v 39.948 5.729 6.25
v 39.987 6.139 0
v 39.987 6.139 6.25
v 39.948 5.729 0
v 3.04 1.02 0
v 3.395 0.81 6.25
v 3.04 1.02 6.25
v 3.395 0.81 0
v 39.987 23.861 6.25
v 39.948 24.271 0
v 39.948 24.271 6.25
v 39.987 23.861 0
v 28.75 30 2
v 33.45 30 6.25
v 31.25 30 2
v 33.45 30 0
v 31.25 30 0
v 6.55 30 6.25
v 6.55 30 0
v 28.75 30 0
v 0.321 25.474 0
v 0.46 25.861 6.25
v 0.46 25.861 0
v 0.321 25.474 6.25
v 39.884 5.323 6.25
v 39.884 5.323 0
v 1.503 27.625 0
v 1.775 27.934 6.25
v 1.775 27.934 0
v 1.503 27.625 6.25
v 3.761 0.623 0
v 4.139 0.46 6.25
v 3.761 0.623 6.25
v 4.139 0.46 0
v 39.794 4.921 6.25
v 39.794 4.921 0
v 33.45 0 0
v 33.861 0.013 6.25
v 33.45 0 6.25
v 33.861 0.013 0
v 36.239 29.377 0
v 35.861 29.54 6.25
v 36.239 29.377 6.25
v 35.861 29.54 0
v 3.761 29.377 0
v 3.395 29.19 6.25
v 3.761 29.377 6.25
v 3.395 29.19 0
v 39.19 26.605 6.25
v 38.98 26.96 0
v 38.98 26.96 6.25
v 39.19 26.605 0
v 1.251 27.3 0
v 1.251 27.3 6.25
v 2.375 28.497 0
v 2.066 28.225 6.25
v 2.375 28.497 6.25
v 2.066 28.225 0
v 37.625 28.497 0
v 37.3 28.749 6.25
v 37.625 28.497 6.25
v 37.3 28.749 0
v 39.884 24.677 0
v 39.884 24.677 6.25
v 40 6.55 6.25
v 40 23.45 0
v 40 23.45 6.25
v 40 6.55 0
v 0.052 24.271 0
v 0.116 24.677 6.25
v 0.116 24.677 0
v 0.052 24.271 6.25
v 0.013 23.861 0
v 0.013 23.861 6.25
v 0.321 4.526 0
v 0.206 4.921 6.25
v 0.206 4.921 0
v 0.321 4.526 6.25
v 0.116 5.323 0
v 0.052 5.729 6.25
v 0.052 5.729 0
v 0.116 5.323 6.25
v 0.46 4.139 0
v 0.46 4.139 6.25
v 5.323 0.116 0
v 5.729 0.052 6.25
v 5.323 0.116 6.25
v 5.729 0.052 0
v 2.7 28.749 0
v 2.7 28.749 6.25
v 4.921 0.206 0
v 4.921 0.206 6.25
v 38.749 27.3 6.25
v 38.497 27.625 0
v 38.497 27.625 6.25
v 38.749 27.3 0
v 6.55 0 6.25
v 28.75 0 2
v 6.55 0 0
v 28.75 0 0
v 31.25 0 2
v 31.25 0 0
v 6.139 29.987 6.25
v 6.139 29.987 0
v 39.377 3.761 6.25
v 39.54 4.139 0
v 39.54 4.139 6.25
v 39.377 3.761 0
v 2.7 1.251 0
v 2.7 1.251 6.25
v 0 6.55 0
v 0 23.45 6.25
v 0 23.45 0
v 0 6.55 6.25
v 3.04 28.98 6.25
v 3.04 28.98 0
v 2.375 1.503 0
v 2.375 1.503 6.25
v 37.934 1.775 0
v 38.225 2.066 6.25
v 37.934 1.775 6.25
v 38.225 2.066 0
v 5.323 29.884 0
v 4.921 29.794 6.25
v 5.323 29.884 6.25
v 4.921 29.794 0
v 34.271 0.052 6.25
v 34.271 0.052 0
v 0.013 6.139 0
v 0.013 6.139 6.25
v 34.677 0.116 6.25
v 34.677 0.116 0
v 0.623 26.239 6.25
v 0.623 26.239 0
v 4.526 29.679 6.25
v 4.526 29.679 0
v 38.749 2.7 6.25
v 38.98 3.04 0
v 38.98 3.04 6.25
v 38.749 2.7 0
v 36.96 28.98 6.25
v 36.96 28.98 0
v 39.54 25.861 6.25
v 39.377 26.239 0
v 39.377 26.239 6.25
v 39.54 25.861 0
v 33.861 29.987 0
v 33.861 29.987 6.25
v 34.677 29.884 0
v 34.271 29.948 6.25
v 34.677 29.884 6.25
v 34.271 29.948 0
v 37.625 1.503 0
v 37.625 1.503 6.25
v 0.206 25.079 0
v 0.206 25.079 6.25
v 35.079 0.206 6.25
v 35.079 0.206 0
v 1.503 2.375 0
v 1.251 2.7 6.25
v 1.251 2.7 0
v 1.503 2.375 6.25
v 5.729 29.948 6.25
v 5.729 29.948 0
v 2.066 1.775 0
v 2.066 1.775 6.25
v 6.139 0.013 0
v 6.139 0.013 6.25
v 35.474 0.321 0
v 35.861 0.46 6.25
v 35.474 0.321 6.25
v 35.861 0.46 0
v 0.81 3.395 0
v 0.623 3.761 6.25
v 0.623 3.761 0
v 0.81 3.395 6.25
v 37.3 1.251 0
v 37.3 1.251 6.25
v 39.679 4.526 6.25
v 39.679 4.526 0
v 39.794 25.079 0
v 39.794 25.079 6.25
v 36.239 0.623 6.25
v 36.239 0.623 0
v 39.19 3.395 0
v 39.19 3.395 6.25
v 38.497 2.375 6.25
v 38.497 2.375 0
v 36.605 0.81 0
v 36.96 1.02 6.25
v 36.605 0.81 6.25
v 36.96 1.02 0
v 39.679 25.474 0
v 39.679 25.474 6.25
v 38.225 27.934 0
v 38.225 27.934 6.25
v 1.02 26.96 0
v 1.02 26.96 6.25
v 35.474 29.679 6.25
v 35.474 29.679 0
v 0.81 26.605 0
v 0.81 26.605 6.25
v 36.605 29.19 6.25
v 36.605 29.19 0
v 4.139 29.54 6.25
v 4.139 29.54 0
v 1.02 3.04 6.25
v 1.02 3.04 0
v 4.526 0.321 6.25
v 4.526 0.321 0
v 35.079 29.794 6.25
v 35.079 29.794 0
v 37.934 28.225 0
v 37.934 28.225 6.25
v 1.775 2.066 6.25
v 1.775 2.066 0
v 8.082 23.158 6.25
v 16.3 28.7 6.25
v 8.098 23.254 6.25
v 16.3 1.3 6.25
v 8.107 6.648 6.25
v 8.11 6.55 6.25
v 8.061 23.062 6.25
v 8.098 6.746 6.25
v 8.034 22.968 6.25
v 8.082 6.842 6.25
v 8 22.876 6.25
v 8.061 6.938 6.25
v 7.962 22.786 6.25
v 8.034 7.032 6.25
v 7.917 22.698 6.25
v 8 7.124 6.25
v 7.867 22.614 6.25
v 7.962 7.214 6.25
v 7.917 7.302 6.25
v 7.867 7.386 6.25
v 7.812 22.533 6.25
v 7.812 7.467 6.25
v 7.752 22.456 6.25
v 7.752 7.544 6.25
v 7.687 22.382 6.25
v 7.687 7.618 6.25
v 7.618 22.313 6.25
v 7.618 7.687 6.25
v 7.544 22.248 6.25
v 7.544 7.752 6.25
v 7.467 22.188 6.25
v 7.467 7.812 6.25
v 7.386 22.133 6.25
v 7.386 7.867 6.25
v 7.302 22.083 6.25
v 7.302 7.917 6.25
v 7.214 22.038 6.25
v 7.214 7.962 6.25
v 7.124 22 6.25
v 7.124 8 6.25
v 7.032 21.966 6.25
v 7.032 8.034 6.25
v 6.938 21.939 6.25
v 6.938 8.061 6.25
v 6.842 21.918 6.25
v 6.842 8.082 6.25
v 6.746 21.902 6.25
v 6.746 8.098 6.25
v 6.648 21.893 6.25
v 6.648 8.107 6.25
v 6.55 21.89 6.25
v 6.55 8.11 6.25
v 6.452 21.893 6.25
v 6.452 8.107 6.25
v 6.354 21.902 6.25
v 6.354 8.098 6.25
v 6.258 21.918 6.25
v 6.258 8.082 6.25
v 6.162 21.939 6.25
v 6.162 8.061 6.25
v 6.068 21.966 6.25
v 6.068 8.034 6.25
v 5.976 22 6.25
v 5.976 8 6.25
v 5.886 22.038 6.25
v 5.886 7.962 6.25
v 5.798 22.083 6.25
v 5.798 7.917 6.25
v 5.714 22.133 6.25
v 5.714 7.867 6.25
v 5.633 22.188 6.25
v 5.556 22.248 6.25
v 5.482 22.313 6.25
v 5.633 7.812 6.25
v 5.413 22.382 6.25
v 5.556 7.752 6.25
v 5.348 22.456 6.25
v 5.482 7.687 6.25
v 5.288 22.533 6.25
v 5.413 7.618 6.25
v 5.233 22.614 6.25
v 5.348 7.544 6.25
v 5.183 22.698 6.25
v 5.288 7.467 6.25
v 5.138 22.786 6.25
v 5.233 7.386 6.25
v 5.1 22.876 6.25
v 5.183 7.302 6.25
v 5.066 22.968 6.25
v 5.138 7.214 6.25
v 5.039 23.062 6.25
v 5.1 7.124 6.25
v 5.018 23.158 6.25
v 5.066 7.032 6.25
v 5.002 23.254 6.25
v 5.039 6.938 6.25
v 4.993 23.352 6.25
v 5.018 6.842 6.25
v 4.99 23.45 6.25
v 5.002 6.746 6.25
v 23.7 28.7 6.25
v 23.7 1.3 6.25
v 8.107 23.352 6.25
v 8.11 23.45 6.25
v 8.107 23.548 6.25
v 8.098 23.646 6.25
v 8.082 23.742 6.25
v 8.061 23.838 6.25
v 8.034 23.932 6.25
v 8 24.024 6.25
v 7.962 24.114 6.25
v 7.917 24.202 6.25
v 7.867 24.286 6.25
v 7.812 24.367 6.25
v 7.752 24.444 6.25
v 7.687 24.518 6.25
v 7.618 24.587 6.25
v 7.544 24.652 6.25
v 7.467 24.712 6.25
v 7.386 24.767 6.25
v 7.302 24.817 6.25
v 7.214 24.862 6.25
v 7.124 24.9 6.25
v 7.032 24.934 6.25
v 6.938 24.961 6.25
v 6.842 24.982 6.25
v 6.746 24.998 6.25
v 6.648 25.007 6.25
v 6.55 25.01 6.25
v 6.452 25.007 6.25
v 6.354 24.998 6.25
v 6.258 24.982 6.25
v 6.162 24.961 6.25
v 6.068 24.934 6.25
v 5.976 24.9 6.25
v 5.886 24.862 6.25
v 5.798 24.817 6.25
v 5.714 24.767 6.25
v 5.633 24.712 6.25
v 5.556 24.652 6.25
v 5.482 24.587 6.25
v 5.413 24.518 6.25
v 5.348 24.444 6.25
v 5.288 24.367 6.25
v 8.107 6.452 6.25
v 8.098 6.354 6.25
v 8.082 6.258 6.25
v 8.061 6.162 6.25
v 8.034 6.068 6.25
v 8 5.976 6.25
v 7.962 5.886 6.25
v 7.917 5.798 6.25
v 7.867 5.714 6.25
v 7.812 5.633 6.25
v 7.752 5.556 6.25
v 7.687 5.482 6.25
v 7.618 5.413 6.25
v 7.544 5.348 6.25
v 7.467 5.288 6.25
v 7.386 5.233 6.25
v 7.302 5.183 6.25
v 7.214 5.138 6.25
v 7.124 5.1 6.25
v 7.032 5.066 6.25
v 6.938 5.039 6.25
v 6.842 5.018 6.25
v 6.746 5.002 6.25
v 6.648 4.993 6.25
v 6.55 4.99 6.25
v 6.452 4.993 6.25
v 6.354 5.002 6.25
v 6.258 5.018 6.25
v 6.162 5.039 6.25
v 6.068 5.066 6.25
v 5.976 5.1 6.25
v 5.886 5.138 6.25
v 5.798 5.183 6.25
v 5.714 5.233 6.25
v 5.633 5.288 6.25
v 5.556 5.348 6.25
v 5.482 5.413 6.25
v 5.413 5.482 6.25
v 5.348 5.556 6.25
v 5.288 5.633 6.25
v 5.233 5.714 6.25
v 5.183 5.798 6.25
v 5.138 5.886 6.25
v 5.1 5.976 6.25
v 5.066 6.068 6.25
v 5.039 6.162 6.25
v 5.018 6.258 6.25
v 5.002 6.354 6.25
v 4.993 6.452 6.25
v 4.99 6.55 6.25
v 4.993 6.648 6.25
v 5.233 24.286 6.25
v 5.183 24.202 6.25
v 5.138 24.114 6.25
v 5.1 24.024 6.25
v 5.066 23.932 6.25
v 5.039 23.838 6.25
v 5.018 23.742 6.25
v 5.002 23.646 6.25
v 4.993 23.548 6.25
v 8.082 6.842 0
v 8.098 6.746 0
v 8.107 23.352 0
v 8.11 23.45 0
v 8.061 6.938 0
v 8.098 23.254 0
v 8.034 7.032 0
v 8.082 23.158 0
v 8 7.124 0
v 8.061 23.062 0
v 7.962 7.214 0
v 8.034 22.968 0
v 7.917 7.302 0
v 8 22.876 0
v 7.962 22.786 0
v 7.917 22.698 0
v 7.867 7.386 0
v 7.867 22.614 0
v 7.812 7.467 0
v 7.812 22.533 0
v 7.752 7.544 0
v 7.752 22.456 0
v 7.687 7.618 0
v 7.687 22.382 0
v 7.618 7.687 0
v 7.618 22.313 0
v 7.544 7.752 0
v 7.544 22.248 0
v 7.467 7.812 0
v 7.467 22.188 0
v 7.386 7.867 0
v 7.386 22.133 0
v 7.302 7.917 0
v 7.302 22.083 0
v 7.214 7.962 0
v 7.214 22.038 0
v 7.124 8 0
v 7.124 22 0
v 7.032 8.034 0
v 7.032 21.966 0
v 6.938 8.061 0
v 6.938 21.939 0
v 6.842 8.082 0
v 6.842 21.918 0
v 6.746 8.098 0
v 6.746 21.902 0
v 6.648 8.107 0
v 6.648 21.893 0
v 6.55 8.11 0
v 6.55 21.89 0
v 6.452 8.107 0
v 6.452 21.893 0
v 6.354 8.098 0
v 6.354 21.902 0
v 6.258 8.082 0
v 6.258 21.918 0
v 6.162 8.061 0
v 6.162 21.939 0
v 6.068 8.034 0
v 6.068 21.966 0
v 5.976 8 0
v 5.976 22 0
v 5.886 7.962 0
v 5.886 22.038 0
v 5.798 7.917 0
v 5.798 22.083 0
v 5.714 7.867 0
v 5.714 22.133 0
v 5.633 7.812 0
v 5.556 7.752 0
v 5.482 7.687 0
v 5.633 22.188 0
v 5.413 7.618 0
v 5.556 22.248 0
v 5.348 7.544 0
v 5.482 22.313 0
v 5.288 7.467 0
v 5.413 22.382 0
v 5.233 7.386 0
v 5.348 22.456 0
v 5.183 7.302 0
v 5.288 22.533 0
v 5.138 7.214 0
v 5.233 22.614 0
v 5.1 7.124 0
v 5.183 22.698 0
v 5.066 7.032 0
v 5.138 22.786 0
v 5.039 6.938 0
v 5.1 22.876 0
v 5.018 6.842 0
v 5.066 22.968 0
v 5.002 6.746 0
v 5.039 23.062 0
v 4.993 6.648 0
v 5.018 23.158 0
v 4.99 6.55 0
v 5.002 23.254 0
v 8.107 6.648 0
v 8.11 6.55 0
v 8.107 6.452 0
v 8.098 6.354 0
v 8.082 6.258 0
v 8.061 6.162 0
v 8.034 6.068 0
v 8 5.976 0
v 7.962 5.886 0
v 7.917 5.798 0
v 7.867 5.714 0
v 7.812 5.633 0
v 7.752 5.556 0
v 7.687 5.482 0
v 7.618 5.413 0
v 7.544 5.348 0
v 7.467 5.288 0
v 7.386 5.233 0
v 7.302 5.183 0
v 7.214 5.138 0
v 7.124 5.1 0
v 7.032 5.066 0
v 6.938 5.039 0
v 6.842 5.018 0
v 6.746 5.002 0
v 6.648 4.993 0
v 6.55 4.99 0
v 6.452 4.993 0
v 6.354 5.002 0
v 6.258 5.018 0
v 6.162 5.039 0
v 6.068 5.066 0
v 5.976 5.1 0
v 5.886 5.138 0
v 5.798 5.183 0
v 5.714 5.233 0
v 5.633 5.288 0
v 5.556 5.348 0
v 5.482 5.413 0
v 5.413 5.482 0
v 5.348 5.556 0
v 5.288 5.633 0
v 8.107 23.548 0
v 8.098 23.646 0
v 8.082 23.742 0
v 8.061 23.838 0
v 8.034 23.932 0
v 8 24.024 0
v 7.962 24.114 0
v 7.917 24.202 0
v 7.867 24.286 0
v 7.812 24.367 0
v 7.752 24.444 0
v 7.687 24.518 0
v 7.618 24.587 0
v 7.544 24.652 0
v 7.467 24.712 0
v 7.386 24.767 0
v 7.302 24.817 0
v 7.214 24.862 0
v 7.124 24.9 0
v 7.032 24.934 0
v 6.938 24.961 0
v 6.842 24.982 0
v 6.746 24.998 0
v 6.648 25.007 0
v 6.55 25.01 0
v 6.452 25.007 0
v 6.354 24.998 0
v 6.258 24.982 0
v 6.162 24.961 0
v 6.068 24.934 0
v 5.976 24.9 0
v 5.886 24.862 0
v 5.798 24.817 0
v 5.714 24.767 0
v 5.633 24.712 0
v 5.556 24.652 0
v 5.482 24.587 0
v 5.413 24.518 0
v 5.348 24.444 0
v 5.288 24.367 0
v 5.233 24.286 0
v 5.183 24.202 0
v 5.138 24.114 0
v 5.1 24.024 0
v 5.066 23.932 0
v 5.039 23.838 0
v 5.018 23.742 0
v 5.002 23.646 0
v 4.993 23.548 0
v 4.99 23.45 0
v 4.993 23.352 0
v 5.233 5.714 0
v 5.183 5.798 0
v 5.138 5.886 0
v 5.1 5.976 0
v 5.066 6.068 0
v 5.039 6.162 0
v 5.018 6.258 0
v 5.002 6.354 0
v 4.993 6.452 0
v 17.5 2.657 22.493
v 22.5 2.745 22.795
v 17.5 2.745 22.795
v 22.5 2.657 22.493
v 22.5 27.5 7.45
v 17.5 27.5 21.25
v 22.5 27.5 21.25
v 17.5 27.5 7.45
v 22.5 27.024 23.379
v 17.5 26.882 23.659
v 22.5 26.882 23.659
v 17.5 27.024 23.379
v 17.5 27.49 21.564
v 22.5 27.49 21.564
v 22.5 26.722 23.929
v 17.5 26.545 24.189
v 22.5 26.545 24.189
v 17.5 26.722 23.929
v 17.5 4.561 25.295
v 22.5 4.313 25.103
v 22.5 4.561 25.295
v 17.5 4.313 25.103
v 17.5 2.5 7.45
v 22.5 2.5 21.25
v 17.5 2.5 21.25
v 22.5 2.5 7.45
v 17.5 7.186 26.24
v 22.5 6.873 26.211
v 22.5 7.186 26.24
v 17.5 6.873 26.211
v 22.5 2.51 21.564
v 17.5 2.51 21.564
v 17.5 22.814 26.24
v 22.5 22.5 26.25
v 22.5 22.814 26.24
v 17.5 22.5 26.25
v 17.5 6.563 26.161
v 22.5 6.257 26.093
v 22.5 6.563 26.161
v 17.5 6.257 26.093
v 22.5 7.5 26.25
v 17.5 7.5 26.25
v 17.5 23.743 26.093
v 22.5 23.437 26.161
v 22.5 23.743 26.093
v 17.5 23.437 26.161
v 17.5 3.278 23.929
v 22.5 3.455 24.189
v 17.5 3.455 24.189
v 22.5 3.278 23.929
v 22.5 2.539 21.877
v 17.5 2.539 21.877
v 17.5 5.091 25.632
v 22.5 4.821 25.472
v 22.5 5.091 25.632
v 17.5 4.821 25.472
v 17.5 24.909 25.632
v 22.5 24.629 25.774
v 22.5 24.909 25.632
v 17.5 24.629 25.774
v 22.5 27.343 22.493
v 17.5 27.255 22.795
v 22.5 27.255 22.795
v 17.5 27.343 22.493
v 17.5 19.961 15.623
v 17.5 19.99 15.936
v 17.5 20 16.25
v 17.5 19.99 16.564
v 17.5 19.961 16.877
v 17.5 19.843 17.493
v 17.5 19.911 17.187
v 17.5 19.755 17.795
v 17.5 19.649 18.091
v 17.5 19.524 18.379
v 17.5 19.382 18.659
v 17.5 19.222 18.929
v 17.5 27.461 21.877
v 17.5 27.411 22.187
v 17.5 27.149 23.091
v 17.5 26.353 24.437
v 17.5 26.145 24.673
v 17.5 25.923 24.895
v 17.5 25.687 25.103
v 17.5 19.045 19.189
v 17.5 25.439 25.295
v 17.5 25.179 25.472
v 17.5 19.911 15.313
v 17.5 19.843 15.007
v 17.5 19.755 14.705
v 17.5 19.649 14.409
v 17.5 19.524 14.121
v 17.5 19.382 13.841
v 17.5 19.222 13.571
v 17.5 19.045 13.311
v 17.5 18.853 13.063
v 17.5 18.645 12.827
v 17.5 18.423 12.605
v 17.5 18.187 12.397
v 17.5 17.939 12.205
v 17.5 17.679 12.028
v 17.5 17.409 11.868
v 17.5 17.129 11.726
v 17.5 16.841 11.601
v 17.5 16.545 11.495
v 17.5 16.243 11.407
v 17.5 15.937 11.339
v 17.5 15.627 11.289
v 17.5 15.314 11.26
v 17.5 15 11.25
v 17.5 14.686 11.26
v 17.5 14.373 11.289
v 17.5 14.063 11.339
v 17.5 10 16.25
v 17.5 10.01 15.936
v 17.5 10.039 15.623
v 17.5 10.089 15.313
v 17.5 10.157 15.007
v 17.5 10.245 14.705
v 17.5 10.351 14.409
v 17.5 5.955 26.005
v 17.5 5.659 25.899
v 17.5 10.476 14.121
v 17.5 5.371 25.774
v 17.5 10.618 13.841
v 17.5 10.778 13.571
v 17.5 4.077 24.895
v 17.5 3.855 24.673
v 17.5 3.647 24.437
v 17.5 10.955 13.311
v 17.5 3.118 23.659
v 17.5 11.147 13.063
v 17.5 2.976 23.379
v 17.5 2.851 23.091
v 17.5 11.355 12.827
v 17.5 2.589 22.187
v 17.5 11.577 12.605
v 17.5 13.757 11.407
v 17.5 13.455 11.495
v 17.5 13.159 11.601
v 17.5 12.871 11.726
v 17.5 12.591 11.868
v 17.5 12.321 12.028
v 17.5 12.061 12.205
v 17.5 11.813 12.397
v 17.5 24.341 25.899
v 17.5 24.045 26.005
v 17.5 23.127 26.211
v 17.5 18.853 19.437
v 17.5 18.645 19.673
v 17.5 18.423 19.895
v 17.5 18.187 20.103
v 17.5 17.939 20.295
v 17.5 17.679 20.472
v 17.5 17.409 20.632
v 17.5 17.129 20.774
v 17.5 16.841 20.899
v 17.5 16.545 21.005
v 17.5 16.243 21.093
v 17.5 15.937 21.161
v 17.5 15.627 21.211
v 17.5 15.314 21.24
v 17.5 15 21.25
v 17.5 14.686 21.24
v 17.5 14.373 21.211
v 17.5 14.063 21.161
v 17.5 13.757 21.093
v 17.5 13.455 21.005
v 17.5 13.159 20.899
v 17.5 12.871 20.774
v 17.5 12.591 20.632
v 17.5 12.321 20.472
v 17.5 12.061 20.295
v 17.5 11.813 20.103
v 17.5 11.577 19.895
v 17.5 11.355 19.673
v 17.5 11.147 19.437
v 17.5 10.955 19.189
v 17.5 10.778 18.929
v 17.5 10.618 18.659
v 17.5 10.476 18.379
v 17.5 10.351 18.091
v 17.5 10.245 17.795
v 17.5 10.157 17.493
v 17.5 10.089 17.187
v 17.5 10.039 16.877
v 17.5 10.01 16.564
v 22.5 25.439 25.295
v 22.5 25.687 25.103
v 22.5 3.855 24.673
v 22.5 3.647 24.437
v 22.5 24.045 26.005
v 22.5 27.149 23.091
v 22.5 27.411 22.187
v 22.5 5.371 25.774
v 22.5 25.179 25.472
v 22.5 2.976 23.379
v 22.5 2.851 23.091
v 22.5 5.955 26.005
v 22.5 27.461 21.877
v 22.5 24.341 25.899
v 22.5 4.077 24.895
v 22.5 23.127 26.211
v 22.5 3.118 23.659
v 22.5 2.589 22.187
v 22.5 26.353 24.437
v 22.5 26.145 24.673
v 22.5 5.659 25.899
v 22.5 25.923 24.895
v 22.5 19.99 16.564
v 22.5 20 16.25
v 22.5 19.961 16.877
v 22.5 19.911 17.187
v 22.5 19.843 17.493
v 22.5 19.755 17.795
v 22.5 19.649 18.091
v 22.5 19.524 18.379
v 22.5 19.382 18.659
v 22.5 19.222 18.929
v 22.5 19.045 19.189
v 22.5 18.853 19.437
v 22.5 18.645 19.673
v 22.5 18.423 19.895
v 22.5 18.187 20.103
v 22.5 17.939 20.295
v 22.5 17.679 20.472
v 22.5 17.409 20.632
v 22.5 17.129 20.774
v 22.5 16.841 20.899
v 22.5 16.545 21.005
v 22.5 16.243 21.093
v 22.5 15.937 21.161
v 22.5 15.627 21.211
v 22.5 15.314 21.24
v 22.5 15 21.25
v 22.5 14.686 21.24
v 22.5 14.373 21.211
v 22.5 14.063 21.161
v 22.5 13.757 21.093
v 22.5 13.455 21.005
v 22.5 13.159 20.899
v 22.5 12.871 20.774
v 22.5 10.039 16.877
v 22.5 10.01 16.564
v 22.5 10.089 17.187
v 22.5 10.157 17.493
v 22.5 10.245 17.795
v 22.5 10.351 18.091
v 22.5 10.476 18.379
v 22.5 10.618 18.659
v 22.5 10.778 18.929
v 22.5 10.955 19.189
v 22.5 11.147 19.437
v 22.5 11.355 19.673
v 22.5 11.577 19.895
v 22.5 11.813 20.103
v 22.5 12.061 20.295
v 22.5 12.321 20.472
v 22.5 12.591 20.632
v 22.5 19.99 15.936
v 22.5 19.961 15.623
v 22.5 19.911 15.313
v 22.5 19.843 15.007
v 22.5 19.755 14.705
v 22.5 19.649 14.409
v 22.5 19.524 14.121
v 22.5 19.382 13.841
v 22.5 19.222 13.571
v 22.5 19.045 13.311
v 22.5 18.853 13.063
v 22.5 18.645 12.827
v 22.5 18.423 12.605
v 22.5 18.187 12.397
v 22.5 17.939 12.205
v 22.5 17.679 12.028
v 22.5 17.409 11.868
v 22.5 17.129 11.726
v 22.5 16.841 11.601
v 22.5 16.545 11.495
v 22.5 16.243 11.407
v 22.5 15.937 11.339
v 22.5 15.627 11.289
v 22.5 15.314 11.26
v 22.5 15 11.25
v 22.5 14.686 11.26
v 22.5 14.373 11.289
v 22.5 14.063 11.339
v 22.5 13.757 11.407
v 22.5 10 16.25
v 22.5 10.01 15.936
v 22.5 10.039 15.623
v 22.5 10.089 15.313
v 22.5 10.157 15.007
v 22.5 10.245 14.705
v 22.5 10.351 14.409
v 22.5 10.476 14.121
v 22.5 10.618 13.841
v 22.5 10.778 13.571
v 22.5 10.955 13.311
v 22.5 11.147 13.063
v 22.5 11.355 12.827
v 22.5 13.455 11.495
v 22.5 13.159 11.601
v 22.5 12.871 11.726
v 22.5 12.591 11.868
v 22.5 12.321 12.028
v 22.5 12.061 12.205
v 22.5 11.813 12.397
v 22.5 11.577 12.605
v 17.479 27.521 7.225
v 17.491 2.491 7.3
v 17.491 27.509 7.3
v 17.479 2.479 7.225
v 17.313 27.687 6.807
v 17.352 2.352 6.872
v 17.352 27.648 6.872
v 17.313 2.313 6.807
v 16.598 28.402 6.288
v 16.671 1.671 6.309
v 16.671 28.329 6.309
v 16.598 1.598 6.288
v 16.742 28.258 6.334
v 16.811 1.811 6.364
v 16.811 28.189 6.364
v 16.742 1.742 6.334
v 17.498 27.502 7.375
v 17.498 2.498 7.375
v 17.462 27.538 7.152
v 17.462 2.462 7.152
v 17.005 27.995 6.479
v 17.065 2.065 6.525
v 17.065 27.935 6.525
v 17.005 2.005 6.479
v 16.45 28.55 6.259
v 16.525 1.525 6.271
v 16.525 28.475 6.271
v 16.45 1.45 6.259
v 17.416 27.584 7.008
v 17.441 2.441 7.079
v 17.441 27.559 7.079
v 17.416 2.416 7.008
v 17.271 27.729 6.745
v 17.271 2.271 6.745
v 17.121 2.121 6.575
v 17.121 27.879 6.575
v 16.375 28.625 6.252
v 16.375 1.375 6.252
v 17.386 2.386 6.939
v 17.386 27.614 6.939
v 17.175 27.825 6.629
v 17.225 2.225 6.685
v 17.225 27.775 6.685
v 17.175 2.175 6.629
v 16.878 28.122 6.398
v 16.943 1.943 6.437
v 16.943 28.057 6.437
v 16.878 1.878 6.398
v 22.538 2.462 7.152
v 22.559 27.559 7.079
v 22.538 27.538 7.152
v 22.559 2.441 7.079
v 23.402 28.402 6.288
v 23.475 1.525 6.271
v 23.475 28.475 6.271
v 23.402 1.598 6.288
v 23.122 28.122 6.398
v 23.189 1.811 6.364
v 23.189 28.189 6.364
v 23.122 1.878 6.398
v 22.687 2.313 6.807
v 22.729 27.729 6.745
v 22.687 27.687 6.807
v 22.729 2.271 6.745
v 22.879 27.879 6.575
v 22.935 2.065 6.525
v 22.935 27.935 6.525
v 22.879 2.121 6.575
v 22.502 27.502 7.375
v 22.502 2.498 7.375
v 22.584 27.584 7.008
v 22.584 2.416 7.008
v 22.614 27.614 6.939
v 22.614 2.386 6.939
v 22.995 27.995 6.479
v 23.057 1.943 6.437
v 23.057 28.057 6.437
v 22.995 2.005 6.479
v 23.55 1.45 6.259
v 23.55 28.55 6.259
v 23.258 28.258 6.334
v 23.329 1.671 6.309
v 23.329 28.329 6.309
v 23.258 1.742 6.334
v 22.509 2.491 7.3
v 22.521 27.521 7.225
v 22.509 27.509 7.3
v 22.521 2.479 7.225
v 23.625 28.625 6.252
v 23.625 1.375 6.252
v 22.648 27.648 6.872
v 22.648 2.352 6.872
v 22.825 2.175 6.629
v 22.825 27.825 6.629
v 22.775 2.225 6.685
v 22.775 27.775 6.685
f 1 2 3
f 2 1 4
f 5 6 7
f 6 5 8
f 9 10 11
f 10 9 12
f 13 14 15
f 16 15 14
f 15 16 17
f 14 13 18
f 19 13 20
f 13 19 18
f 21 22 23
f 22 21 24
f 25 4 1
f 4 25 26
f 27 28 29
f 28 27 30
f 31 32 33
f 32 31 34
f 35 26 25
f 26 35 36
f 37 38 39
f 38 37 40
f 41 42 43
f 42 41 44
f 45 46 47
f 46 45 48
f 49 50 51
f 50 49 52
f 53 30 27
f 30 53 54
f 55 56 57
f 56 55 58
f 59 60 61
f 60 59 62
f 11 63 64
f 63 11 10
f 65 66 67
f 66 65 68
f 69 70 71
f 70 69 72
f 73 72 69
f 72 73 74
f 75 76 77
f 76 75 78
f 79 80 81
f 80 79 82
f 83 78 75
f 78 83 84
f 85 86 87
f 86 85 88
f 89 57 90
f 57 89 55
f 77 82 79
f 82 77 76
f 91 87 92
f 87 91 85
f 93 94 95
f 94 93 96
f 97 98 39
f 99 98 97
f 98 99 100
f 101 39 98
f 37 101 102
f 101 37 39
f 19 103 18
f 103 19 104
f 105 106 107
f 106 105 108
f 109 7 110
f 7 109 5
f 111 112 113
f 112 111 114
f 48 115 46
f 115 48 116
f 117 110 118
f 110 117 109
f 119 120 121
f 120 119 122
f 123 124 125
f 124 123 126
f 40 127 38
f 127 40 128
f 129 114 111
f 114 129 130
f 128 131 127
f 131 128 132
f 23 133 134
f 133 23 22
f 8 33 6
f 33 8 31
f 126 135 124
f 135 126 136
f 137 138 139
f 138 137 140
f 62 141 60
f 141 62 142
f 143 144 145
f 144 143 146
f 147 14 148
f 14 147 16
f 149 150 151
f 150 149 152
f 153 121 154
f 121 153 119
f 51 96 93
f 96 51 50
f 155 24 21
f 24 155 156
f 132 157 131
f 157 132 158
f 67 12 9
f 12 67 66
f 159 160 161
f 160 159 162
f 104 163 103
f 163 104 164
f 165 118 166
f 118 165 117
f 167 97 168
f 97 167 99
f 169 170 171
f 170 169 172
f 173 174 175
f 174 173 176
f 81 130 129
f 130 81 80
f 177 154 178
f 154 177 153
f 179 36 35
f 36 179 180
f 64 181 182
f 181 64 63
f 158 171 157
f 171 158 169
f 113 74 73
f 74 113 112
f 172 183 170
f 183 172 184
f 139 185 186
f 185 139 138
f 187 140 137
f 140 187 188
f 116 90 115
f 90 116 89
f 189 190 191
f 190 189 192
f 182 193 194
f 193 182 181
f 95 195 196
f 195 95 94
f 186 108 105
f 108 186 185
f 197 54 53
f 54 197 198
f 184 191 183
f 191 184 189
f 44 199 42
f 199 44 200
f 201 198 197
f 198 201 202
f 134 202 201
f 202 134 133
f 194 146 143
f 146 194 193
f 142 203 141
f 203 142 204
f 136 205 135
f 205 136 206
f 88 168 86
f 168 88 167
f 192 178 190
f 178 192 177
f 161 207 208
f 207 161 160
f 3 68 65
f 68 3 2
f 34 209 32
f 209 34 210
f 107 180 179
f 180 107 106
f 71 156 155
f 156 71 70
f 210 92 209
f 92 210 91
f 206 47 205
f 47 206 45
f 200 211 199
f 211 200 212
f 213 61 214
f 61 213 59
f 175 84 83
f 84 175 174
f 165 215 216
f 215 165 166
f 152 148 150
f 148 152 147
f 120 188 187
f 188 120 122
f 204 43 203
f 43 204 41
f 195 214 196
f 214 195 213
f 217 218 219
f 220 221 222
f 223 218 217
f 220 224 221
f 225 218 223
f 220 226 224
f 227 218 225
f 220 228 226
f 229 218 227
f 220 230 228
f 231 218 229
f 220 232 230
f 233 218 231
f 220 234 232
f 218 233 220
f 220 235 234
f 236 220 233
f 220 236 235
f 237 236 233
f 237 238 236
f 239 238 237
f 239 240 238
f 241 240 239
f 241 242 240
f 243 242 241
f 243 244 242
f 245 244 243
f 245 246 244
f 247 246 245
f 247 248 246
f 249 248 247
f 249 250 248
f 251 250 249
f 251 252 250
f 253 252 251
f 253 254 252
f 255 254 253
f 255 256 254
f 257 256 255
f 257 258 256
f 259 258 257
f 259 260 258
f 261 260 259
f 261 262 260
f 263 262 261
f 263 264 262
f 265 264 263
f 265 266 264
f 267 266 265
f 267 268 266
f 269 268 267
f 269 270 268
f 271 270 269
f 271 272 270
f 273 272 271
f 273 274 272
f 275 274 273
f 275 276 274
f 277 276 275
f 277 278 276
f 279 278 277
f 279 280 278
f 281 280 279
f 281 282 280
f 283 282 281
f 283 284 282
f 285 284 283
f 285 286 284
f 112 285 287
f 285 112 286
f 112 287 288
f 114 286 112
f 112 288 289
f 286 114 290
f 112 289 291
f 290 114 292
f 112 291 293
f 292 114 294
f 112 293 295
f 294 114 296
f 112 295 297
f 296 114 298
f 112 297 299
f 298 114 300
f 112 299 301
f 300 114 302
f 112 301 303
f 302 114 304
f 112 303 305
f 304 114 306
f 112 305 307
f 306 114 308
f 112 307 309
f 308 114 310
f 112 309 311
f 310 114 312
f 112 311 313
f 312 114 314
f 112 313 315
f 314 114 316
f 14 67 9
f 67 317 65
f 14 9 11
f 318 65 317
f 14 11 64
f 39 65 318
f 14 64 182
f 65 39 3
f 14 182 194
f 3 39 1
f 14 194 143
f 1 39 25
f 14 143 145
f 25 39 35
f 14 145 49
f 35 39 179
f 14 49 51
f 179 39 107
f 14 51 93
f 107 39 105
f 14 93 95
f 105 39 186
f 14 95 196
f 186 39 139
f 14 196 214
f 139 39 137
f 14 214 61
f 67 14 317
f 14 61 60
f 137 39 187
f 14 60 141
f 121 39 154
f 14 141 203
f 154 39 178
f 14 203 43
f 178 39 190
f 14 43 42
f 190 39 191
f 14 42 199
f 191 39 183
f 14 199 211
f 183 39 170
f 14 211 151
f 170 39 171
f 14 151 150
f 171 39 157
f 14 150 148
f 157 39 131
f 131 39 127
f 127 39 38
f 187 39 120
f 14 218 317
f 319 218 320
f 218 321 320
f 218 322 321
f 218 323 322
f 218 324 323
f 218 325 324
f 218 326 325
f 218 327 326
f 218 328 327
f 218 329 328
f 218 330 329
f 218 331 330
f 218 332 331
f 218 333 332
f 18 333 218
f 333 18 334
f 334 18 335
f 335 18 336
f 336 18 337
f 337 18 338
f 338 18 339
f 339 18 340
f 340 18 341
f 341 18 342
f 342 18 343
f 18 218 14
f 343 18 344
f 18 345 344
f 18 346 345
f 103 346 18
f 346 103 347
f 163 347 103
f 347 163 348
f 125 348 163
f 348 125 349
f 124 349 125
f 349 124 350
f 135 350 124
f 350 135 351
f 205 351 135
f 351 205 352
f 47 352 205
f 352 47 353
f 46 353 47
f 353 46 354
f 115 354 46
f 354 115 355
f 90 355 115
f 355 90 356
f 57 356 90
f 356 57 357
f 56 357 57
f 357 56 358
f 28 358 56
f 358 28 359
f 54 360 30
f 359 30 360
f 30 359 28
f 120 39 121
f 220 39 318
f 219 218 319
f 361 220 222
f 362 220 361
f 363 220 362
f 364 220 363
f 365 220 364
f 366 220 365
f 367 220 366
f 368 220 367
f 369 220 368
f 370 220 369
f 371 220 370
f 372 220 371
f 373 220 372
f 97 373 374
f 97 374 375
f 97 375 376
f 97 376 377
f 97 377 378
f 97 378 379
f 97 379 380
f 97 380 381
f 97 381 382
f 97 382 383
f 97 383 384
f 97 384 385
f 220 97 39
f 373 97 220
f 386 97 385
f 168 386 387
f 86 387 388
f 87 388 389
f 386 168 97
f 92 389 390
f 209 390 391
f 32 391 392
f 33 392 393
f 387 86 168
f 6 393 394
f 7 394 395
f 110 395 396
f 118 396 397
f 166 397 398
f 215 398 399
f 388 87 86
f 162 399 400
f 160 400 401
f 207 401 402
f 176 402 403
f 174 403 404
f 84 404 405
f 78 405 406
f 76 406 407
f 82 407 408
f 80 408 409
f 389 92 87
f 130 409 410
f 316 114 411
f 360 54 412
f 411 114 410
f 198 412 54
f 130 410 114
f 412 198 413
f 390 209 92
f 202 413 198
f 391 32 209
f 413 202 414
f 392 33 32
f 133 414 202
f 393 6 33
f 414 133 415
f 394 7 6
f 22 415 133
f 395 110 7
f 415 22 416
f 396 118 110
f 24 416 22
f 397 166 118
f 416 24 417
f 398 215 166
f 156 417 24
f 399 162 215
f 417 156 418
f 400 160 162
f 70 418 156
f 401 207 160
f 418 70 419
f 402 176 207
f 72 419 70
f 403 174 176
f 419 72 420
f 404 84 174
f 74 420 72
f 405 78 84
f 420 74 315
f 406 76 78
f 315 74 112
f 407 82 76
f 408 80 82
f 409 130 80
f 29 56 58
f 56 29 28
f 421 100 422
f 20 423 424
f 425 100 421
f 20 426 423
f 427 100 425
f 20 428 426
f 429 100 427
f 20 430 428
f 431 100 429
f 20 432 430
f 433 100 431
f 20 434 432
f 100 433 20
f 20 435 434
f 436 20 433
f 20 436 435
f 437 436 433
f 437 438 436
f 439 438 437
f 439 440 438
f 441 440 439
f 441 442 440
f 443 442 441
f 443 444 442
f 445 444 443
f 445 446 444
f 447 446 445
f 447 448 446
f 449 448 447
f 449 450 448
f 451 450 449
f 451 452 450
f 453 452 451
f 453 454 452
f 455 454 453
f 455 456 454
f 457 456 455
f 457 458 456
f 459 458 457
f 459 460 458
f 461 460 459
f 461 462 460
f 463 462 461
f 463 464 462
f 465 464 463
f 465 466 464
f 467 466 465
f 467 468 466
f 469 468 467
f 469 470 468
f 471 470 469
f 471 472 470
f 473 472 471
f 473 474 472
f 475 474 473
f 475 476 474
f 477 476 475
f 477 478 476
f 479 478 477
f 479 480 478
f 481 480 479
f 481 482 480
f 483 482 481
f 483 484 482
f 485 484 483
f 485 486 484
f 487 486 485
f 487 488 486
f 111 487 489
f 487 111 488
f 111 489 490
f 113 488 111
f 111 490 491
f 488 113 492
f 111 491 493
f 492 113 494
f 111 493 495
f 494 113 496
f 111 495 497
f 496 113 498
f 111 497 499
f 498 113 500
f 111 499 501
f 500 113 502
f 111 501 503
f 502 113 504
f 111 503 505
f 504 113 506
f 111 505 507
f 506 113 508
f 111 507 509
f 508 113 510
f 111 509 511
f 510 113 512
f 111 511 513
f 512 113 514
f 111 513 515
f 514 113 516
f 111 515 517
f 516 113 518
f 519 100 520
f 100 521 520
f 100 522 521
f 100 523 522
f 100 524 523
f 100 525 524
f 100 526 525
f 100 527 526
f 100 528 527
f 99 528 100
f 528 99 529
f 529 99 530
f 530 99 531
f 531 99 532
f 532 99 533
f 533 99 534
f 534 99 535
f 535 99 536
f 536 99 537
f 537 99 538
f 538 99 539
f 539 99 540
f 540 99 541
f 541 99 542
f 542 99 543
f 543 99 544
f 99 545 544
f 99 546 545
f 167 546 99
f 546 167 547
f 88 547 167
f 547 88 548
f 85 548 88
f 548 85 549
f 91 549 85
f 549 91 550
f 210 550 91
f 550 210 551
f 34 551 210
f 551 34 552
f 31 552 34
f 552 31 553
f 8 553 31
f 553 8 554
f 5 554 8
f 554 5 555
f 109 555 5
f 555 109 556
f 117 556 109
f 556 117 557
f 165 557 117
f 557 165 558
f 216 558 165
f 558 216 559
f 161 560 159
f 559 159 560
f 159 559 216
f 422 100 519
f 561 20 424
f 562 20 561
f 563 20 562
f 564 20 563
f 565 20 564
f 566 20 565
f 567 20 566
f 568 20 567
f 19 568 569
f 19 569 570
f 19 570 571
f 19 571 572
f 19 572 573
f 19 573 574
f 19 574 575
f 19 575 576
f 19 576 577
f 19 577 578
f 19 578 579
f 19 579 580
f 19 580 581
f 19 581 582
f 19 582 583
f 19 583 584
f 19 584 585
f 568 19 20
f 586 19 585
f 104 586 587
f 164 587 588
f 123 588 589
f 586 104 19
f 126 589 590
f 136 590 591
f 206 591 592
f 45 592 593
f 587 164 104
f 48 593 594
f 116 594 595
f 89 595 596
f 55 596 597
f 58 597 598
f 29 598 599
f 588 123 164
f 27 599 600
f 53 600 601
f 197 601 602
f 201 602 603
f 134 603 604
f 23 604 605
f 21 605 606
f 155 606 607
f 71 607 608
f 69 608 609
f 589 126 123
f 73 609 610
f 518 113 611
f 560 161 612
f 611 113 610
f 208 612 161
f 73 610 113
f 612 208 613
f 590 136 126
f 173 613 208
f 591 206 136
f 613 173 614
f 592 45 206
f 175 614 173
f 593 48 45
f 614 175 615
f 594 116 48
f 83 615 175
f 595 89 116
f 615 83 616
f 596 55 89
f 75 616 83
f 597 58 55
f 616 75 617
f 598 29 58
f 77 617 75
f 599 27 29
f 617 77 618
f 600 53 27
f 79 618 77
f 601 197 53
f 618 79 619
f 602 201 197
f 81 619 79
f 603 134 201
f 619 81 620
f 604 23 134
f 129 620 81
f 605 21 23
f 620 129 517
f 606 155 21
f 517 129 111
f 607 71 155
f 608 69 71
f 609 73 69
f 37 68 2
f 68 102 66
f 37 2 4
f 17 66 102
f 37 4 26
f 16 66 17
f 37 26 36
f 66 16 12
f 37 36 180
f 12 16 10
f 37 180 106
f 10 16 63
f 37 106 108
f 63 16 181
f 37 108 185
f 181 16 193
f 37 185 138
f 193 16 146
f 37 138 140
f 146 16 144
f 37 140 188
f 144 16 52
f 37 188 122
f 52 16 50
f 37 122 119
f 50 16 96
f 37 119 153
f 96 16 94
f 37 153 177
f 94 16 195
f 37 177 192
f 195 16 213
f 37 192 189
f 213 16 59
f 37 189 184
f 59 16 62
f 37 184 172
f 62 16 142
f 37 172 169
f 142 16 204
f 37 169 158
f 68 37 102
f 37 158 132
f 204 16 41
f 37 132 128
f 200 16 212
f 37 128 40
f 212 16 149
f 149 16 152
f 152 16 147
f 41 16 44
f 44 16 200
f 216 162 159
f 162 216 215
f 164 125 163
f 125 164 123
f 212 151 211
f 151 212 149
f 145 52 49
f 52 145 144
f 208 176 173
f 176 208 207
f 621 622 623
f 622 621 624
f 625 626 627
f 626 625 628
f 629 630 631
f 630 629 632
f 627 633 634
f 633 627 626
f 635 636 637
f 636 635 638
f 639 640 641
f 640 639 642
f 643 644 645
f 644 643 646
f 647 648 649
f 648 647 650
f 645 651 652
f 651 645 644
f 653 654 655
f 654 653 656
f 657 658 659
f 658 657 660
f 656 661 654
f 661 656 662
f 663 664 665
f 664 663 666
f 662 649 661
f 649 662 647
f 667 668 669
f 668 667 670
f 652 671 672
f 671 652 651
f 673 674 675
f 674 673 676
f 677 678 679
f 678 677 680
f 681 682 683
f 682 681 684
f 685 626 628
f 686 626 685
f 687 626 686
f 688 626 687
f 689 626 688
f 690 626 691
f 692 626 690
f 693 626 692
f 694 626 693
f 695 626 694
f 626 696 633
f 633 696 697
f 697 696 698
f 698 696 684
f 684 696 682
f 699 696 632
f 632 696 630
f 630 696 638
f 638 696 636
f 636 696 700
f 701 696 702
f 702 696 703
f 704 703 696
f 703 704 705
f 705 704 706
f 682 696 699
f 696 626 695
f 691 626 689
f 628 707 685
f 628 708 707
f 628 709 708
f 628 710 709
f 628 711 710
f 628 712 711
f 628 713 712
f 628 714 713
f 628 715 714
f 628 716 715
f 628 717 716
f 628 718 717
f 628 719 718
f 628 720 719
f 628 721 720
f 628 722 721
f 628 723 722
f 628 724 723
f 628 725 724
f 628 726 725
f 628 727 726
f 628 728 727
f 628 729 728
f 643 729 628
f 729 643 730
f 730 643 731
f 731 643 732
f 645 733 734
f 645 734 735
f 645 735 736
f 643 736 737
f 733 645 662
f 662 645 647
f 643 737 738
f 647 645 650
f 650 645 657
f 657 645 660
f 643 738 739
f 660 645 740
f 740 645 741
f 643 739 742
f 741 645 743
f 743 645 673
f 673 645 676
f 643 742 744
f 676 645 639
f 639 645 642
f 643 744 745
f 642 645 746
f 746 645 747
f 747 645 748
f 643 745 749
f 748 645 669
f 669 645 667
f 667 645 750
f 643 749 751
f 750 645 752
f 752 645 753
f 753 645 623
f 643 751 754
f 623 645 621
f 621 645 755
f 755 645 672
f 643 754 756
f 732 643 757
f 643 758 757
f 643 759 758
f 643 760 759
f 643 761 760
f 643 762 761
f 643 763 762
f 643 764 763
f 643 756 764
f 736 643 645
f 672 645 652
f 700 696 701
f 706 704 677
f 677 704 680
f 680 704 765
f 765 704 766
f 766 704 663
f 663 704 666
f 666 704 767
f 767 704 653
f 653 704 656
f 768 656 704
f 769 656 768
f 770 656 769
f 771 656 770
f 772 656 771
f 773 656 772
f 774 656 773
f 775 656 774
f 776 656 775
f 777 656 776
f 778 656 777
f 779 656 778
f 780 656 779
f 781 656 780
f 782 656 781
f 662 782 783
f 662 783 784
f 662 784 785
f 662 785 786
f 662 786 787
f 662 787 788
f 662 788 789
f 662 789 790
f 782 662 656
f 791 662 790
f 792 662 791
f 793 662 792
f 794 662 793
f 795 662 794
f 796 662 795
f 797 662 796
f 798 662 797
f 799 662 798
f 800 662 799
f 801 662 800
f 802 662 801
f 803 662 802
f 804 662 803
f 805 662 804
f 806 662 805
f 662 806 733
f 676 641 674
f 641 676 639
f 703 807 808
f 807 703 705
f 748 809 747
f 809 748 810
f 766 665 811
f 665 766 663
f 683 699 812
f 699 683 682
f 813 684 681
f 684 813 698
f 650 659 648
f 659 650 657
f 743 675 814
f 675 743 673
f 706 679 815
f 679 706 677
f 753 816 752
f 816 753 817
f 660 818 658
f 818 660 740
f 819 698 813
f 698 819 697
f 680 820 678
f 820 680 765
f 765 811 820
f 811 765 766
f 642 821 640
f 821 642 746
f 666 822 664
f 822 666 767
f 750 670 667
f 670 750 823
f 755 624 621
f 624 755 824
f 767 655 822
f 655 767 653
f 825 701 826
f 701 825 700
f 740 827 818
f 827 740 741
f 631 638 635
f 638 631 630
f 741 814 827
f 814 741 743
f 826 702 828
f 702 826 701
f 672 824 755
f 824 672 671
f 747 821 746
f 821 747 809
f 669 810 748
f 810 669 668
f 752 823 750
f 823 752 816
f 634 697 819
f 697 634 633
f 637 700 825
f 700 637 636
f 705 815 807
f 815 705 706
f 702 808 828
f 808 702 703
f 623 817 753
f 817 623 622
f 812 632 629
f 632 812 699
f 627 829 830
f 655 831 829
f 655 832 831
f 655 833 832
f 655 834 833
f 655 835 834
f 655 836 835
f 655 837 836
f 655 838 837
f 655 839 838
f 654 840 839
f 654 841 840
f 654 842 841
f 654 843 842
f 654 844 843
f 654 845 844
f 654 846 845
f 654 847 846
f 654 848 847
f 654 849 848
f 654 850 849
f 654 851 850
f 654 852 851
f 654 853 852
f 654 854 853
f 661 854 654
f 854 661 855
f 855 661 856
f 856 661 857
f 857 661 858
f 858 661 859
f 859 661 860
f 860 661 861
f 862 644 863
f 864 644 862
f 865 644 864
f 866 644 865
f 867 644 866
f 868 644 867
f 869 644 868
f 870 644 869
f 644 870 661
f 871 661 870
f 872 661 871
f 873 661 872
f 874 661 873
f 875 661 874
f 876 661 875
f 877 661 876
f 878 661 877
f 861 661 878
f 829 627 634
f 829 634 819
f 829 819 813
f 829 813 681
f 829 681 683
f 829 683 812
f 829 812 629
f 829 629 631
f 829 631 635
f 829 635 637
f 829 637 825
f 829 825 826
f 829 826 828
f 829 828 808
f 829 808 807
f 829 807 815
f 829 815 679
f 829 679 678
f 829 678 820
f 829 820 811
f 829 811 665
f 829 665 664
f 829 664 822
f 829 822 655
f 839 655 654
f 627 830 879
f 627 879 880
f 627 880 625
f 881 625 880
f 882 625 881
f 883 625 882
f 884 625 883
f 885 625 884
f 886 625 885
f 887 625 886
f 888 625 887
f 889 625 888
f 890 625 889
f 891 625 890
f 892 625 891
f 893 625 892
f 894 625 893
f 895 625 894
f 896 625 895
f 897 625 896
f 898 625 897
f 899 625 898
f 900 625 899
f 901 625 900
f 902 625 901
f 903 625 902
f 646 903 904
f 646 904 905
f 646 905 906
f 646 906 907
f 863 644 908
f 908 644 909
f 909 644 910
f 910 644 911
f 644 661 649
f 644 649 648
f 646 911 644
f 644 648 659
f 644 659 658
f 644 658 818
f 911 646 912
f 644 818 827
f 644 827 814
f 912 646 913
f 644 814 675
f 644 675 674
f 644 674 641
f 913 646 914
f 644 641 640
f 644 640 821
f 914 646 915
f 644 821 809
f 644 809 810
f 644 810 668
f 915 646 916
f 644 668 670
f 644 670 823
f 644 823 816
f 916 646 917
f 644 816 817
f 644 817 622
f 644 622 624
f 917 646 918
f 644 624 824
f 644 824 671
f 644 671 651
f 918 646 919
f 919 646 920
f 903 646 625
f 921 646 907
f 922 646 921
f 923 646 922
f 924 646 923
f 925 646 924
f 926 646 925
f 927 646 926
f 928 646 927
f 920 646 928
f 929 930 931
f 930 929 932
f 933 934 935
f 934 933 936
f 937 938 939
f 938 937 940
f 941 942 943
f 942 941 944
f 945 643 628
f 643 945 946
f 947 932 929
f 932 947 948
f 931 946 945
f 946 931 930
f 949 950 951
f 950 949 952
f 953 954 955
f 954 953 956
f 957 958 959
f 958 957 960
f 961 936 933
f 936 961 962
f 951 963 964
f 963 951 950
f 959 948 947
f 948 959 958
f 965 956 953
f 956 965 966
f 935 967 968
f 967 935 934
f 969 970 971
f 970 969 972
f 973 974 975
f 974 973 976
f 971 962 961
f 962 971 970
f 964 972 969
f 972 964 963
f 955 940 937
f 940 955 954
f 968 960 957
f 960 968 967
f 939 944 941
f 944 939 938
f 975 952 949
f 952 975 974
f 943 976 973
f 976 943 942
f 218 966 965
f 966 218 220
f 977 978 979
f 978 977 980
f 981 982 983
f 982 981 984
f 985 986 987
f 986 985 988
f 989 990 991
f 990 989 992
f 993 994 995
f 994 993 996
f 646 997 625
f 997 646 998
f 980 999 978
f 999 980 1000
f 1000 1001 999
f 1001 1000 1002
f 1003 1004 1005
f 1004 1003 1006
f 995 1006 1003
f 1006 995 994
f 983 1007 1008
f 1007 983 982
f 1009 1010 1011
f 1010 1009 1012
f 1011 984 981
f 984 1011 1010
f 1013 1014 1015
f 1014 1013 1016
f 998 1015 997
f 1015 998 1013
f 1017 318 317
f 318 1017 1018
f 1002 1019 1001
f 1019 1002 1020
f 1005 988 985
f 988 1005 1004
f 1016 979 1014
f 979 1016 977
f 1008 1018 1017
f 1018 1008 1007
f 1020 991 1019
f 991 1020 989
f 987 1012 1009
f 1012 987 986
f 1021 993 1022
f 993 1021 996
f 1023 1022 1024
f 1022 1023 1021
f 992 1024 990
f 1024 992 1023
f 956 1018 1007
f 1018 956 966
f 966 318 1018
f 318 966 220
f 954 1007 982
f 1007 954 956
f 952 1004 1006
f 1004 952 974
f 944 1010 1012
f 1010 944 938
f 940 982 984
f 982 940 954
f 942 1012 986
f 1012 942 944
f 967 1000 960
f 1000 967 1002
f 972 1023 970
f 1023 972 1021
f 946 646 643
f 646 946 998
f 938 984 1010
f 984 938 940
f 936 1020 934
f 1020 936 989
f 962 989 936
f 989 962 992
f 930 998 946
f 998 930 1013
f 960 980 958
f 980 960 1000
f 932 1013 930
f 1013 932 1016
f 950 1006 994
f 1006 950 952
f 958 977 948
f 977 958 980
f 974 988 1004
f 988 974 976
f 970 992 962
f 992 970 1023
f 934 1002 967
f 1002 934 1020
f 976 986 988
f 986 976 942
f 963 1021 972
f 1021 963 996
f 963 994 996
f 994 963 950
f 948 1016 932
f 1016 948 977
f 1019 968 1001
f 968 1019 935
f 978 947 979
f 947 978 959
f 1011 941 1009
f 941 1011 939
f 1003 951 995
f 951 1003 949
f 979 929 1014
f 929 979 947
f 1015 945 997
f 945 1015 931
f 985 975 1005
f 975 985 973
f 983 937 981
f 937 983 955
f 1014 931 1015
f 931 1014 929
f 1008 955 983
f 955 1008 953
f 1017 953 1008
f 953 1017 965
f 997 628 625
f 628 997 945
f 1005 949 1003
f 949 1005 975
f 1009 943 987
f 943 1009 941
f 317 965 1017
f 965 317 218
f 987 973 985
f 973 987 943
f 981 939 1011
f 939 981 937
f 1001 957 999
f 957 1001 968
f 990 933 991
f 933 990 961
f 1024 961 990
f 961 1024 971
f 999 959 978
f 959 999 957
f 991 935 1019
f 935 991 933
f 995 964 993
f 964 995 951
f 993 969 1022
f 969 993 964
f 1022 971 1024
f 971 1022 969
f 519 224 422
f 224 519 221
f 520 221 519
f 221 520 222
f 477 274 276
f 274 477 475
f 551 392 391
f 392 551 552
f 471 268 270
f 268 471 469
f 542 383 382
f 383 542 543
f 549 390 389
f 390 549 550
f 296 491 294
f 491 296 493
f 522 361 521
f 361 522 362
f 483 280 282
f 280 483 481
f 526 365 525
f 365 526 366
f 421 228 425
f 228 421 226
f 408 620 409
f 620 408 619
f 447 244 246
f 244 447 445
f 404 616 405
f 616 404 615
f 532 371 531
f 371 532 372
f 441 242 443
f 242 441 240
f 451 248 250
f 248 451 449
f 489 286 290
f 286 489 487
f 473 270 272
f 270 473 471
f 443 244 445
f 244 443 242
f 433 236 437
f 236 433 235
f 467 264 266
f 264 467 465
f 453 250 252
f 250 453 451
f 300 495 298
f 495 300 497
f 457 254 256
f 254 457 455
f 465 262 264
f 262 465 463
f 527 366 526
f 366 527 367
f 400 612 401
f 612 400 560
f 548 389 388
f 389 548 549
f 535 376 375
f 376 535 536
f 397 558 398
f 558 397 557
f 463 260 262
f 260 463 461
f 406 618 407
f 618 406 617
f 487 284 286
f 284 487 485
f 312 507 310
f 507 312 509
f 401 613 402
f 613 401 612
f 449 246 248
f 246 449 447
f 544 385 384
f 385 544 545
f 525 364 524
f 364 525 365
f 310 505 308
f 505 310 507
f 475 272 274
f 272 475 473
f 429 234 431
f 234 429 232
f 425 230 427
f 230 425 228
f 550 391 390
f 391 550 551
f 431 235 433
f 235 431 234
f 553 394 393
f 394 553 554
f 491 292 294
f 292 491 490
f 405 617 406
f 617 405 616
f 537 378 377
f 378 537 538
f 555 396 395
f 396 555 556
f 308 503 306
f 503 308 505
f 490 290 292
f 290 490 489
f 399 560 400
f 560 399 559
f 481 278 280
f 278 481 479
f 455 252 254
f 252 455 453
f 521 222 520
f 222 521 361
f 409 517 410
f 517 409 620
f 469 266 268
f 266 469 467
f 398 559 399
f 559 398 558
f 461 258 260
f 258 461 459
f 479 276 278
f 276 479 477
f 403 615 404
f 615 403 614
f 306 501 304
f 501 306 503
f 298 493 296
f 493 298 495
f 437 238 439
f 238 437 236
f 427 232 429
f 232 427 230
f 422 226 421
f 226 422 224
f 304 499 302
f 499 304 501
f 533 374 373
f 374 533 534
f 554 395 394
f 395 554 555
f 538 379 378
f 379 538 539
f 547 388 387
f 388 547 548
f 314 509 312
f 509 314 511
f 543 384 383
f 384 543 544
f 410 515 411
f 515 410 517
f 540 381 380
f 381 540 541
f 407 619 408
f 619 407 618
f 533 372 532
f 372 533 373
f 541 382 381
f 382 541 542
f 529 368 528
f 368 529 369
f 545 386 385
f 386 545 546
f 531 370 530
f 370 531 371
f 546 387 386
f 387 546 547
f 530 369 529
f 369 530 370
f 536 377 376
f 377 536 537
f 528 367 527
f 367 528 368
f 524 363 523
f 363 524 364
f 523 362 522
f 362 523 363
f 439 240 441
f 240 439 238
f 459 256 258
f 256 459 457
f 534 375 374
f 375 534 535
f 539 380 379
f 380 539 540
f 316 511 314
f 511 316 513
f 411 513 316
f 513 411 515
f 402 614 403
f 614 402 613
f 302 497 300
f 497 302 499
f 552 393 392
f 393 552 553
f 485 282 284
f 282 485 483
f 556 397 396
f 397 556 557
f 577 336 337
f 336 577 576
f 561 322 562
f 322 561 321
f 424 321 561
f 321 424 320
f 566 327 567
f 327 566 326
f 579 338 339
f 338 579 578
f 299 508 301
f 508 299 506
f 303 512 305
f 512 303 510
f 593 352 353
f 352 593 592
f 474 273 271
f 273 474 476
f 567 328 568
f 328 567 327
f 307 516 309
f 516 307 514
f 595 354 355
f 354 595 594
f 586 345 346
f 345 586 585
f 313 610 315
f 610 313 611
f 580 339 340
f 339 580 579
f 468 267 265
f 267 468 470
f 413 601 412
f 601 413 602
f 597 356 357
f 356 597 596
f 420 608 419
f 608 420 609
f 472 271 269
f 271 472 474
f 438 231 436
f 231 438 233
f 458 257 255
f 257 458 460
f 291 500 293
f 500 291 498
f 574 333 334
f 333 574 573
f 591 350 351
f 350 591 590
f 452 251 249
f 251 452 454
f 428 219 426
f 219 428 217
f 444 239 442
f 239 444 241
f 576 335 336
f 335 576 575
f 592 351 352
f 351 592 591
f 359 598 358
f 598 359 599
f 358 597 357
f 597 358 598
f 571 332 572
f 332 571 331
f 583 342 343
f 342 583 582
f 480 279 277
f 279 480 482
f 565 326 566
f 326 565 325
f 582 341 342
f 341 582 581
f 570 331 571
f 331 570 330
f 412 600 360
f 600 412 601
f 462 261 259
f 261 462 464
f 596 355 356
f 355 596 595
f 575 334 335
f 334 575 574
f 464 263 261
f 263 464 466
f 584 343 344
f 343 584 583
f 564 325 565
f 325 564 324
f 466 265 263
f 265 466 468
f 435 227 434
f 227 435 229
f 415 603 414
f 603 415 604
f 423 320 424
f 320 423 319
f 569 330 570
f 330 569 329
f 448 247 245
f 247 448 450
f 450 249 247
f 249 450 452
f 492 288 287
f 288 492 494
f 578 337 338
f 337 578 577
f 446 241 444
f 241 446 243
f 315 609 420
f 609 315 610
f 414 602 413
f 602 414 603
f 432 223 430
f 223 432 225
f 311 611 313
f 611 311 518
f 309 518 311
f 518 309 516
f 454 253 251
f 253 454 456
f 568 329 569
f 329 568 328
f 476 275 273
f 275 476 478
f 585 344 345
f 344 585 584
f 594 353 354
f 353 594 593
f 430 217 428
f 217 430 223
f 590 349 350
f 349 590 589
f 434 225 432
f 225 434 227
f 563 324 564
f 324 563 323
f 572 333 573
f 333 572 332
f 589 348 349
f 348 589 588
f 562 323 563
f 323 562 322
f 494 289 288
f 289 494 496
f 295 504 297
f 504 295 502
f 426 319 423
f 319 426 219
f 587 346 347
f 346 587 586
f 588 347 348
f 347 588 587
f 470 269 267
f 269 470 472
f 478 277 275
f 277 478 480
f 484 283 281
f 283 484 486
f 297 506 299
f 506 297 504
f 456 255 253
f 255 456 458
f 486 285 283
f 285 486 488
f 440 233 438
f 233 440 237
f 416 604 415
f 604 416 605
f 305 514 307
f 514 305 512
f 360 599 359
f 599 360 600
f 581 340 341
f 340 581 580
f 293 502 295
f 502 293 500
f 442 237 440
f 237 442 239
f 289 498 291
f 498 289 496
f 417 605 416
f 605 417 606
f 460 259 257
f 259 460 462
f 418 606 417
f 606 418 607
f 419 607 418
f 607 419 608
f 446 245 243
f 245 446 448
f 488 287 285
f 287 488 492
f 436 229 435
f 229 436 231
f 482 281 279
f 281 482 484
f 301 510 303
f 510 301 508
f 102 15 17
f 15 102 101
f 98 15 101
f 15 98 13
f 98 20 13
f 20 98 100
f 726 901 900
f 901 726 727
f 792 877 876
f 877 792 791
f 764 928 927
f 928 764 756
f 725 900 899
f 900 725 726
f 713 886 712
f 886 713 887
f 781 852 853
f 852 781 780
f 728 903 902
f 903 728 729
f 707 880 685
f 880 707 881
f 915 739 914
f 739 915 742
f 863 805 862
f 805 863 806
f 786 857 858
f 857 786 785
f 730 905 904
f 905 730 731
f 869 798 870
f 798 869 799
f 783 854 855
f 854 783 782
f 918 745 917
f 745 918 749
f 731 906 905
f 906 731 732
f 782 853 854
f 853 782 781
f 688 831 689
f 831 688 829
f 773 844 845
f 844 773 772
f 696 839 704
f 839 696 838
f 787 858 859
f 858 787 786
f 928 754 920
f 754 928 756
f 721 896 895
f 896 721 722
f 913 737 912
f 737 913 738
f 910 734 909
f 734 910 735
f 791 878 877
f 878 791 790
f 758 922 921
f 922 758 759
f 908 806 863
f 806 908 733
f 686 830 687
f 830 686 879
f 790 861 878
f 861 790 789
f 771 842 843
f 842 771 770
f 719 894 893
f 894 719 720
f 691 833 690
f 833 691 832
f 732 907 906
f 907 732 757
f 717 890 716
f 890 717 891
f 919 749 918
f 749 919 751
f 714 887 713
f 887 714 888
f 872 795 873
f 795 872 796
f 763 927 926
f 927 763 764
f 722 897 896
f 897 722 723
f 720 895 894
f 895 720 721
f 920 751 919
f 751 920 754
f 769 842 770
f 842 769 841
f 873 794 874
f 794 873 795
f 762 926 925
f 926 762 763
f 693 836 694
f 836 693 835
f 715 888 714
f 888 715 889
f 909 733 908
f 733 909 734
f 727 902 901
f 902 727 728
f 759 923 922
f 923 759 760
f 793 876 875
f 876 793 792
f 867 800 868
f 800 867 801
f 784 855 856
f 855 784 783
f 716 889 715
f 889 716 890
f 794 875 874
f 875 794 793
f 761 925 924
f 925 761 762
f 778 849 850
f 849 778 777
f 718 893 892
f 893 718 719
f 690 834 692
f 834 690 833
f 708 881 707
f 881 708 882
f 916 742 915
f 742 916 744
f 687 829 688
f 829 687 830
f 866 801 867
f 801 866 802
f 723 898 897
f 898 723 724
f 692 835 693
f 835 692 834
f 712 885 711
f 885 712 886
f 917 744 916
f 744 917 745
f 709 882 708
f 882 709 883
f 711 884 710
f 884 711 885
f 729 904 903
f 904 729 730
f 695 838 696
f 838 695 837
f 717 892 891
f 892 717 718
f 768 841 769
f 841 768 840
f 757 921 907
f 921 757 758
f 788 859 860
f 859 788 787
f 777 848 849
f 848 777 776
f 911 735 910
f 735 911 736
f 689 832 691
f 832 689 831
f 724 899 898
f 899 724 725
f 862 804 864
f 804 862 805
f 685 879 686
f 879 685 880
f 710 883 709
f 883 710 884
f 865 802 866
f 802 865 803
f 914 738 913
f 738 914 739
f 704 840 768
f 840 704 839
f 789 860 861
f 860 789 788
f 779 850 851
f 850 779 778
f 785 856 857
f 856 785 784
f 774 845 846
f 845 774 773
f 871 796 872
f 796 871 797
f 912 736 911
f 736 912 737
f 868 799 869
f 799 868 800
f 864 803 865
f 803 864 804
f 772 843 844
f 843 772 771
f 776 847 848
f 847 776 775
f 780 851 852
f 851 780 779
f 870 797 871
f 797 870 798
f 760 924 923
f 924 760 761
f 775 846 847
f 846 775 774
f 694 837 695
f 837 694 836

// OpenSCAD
$fn=100;
scale([10,10,10]) {
    difference() {
        union() {
            translate([.655, .655, 0])
            hull() {

                cylinder(r=.655, h=.625);
                translate([4-2*.655, 0, 0])
                cylinder(r=.655, h=.625);
                translate([4-2*.655, 3-2*.655, 0])
                cylinder(r=.655, h=.625);
                translate([0, 3-2*.655, 0])
                cylinder(r=.655, h=.625);
            }
            
            translate([2-.25,0,-0.5+.625+2])
            rotate([0,90,0])
            translate([0,.5+.25,0])
            hull() {
                cylinder(r=.5, h=.5);
                translate([0, 2.5-2*.5, 0])
                cylinder(r=.5, h=.5);
                translate([2-1.5, -.5, 0])
                cube([1,2.5,.5]);
            }
            translate([2-(.5+2*.12)/2,0,.625])
            translate([(.5+2*.12)/2, 1.5,.12/2])
            cube([.5+2*.12, 2.5+2*.12, .12], center=true);
        }
        
        translate([.655, .655, -0.001])
        cylinder(d=.312, h=.627);
        translate([.655, 2.345, -0.001])
        cylinder(d=.312, h=.627);
        
        translate([4-1-.25/2,-0.1,-0.01])
        cube([.250, 3.2, .21]);
        
        translate([1.5,1.5,1.625])
        rotate([0,90,0])
        cylinder(d=1, h=1);
        
        translate([0,0,.625+.12])
        rotate([-90,0,0]) {
            translate([2-.25-.12,0,0])
            cylinder(r=.12, h=4);
            translate([2+.25+.12,0,0])
            cylinder(r=.12, h=4);
        }

        translate([0,0,.625+.12])
        rotate([0,90,0]) {
            translate([0,1.5-1.25-.12,0])
            cylinder(r=.12, h=4);
            translate([0,1.5+1.25+.12,0])
            cylinder(r=.12, h=4);
        }
    }
}
